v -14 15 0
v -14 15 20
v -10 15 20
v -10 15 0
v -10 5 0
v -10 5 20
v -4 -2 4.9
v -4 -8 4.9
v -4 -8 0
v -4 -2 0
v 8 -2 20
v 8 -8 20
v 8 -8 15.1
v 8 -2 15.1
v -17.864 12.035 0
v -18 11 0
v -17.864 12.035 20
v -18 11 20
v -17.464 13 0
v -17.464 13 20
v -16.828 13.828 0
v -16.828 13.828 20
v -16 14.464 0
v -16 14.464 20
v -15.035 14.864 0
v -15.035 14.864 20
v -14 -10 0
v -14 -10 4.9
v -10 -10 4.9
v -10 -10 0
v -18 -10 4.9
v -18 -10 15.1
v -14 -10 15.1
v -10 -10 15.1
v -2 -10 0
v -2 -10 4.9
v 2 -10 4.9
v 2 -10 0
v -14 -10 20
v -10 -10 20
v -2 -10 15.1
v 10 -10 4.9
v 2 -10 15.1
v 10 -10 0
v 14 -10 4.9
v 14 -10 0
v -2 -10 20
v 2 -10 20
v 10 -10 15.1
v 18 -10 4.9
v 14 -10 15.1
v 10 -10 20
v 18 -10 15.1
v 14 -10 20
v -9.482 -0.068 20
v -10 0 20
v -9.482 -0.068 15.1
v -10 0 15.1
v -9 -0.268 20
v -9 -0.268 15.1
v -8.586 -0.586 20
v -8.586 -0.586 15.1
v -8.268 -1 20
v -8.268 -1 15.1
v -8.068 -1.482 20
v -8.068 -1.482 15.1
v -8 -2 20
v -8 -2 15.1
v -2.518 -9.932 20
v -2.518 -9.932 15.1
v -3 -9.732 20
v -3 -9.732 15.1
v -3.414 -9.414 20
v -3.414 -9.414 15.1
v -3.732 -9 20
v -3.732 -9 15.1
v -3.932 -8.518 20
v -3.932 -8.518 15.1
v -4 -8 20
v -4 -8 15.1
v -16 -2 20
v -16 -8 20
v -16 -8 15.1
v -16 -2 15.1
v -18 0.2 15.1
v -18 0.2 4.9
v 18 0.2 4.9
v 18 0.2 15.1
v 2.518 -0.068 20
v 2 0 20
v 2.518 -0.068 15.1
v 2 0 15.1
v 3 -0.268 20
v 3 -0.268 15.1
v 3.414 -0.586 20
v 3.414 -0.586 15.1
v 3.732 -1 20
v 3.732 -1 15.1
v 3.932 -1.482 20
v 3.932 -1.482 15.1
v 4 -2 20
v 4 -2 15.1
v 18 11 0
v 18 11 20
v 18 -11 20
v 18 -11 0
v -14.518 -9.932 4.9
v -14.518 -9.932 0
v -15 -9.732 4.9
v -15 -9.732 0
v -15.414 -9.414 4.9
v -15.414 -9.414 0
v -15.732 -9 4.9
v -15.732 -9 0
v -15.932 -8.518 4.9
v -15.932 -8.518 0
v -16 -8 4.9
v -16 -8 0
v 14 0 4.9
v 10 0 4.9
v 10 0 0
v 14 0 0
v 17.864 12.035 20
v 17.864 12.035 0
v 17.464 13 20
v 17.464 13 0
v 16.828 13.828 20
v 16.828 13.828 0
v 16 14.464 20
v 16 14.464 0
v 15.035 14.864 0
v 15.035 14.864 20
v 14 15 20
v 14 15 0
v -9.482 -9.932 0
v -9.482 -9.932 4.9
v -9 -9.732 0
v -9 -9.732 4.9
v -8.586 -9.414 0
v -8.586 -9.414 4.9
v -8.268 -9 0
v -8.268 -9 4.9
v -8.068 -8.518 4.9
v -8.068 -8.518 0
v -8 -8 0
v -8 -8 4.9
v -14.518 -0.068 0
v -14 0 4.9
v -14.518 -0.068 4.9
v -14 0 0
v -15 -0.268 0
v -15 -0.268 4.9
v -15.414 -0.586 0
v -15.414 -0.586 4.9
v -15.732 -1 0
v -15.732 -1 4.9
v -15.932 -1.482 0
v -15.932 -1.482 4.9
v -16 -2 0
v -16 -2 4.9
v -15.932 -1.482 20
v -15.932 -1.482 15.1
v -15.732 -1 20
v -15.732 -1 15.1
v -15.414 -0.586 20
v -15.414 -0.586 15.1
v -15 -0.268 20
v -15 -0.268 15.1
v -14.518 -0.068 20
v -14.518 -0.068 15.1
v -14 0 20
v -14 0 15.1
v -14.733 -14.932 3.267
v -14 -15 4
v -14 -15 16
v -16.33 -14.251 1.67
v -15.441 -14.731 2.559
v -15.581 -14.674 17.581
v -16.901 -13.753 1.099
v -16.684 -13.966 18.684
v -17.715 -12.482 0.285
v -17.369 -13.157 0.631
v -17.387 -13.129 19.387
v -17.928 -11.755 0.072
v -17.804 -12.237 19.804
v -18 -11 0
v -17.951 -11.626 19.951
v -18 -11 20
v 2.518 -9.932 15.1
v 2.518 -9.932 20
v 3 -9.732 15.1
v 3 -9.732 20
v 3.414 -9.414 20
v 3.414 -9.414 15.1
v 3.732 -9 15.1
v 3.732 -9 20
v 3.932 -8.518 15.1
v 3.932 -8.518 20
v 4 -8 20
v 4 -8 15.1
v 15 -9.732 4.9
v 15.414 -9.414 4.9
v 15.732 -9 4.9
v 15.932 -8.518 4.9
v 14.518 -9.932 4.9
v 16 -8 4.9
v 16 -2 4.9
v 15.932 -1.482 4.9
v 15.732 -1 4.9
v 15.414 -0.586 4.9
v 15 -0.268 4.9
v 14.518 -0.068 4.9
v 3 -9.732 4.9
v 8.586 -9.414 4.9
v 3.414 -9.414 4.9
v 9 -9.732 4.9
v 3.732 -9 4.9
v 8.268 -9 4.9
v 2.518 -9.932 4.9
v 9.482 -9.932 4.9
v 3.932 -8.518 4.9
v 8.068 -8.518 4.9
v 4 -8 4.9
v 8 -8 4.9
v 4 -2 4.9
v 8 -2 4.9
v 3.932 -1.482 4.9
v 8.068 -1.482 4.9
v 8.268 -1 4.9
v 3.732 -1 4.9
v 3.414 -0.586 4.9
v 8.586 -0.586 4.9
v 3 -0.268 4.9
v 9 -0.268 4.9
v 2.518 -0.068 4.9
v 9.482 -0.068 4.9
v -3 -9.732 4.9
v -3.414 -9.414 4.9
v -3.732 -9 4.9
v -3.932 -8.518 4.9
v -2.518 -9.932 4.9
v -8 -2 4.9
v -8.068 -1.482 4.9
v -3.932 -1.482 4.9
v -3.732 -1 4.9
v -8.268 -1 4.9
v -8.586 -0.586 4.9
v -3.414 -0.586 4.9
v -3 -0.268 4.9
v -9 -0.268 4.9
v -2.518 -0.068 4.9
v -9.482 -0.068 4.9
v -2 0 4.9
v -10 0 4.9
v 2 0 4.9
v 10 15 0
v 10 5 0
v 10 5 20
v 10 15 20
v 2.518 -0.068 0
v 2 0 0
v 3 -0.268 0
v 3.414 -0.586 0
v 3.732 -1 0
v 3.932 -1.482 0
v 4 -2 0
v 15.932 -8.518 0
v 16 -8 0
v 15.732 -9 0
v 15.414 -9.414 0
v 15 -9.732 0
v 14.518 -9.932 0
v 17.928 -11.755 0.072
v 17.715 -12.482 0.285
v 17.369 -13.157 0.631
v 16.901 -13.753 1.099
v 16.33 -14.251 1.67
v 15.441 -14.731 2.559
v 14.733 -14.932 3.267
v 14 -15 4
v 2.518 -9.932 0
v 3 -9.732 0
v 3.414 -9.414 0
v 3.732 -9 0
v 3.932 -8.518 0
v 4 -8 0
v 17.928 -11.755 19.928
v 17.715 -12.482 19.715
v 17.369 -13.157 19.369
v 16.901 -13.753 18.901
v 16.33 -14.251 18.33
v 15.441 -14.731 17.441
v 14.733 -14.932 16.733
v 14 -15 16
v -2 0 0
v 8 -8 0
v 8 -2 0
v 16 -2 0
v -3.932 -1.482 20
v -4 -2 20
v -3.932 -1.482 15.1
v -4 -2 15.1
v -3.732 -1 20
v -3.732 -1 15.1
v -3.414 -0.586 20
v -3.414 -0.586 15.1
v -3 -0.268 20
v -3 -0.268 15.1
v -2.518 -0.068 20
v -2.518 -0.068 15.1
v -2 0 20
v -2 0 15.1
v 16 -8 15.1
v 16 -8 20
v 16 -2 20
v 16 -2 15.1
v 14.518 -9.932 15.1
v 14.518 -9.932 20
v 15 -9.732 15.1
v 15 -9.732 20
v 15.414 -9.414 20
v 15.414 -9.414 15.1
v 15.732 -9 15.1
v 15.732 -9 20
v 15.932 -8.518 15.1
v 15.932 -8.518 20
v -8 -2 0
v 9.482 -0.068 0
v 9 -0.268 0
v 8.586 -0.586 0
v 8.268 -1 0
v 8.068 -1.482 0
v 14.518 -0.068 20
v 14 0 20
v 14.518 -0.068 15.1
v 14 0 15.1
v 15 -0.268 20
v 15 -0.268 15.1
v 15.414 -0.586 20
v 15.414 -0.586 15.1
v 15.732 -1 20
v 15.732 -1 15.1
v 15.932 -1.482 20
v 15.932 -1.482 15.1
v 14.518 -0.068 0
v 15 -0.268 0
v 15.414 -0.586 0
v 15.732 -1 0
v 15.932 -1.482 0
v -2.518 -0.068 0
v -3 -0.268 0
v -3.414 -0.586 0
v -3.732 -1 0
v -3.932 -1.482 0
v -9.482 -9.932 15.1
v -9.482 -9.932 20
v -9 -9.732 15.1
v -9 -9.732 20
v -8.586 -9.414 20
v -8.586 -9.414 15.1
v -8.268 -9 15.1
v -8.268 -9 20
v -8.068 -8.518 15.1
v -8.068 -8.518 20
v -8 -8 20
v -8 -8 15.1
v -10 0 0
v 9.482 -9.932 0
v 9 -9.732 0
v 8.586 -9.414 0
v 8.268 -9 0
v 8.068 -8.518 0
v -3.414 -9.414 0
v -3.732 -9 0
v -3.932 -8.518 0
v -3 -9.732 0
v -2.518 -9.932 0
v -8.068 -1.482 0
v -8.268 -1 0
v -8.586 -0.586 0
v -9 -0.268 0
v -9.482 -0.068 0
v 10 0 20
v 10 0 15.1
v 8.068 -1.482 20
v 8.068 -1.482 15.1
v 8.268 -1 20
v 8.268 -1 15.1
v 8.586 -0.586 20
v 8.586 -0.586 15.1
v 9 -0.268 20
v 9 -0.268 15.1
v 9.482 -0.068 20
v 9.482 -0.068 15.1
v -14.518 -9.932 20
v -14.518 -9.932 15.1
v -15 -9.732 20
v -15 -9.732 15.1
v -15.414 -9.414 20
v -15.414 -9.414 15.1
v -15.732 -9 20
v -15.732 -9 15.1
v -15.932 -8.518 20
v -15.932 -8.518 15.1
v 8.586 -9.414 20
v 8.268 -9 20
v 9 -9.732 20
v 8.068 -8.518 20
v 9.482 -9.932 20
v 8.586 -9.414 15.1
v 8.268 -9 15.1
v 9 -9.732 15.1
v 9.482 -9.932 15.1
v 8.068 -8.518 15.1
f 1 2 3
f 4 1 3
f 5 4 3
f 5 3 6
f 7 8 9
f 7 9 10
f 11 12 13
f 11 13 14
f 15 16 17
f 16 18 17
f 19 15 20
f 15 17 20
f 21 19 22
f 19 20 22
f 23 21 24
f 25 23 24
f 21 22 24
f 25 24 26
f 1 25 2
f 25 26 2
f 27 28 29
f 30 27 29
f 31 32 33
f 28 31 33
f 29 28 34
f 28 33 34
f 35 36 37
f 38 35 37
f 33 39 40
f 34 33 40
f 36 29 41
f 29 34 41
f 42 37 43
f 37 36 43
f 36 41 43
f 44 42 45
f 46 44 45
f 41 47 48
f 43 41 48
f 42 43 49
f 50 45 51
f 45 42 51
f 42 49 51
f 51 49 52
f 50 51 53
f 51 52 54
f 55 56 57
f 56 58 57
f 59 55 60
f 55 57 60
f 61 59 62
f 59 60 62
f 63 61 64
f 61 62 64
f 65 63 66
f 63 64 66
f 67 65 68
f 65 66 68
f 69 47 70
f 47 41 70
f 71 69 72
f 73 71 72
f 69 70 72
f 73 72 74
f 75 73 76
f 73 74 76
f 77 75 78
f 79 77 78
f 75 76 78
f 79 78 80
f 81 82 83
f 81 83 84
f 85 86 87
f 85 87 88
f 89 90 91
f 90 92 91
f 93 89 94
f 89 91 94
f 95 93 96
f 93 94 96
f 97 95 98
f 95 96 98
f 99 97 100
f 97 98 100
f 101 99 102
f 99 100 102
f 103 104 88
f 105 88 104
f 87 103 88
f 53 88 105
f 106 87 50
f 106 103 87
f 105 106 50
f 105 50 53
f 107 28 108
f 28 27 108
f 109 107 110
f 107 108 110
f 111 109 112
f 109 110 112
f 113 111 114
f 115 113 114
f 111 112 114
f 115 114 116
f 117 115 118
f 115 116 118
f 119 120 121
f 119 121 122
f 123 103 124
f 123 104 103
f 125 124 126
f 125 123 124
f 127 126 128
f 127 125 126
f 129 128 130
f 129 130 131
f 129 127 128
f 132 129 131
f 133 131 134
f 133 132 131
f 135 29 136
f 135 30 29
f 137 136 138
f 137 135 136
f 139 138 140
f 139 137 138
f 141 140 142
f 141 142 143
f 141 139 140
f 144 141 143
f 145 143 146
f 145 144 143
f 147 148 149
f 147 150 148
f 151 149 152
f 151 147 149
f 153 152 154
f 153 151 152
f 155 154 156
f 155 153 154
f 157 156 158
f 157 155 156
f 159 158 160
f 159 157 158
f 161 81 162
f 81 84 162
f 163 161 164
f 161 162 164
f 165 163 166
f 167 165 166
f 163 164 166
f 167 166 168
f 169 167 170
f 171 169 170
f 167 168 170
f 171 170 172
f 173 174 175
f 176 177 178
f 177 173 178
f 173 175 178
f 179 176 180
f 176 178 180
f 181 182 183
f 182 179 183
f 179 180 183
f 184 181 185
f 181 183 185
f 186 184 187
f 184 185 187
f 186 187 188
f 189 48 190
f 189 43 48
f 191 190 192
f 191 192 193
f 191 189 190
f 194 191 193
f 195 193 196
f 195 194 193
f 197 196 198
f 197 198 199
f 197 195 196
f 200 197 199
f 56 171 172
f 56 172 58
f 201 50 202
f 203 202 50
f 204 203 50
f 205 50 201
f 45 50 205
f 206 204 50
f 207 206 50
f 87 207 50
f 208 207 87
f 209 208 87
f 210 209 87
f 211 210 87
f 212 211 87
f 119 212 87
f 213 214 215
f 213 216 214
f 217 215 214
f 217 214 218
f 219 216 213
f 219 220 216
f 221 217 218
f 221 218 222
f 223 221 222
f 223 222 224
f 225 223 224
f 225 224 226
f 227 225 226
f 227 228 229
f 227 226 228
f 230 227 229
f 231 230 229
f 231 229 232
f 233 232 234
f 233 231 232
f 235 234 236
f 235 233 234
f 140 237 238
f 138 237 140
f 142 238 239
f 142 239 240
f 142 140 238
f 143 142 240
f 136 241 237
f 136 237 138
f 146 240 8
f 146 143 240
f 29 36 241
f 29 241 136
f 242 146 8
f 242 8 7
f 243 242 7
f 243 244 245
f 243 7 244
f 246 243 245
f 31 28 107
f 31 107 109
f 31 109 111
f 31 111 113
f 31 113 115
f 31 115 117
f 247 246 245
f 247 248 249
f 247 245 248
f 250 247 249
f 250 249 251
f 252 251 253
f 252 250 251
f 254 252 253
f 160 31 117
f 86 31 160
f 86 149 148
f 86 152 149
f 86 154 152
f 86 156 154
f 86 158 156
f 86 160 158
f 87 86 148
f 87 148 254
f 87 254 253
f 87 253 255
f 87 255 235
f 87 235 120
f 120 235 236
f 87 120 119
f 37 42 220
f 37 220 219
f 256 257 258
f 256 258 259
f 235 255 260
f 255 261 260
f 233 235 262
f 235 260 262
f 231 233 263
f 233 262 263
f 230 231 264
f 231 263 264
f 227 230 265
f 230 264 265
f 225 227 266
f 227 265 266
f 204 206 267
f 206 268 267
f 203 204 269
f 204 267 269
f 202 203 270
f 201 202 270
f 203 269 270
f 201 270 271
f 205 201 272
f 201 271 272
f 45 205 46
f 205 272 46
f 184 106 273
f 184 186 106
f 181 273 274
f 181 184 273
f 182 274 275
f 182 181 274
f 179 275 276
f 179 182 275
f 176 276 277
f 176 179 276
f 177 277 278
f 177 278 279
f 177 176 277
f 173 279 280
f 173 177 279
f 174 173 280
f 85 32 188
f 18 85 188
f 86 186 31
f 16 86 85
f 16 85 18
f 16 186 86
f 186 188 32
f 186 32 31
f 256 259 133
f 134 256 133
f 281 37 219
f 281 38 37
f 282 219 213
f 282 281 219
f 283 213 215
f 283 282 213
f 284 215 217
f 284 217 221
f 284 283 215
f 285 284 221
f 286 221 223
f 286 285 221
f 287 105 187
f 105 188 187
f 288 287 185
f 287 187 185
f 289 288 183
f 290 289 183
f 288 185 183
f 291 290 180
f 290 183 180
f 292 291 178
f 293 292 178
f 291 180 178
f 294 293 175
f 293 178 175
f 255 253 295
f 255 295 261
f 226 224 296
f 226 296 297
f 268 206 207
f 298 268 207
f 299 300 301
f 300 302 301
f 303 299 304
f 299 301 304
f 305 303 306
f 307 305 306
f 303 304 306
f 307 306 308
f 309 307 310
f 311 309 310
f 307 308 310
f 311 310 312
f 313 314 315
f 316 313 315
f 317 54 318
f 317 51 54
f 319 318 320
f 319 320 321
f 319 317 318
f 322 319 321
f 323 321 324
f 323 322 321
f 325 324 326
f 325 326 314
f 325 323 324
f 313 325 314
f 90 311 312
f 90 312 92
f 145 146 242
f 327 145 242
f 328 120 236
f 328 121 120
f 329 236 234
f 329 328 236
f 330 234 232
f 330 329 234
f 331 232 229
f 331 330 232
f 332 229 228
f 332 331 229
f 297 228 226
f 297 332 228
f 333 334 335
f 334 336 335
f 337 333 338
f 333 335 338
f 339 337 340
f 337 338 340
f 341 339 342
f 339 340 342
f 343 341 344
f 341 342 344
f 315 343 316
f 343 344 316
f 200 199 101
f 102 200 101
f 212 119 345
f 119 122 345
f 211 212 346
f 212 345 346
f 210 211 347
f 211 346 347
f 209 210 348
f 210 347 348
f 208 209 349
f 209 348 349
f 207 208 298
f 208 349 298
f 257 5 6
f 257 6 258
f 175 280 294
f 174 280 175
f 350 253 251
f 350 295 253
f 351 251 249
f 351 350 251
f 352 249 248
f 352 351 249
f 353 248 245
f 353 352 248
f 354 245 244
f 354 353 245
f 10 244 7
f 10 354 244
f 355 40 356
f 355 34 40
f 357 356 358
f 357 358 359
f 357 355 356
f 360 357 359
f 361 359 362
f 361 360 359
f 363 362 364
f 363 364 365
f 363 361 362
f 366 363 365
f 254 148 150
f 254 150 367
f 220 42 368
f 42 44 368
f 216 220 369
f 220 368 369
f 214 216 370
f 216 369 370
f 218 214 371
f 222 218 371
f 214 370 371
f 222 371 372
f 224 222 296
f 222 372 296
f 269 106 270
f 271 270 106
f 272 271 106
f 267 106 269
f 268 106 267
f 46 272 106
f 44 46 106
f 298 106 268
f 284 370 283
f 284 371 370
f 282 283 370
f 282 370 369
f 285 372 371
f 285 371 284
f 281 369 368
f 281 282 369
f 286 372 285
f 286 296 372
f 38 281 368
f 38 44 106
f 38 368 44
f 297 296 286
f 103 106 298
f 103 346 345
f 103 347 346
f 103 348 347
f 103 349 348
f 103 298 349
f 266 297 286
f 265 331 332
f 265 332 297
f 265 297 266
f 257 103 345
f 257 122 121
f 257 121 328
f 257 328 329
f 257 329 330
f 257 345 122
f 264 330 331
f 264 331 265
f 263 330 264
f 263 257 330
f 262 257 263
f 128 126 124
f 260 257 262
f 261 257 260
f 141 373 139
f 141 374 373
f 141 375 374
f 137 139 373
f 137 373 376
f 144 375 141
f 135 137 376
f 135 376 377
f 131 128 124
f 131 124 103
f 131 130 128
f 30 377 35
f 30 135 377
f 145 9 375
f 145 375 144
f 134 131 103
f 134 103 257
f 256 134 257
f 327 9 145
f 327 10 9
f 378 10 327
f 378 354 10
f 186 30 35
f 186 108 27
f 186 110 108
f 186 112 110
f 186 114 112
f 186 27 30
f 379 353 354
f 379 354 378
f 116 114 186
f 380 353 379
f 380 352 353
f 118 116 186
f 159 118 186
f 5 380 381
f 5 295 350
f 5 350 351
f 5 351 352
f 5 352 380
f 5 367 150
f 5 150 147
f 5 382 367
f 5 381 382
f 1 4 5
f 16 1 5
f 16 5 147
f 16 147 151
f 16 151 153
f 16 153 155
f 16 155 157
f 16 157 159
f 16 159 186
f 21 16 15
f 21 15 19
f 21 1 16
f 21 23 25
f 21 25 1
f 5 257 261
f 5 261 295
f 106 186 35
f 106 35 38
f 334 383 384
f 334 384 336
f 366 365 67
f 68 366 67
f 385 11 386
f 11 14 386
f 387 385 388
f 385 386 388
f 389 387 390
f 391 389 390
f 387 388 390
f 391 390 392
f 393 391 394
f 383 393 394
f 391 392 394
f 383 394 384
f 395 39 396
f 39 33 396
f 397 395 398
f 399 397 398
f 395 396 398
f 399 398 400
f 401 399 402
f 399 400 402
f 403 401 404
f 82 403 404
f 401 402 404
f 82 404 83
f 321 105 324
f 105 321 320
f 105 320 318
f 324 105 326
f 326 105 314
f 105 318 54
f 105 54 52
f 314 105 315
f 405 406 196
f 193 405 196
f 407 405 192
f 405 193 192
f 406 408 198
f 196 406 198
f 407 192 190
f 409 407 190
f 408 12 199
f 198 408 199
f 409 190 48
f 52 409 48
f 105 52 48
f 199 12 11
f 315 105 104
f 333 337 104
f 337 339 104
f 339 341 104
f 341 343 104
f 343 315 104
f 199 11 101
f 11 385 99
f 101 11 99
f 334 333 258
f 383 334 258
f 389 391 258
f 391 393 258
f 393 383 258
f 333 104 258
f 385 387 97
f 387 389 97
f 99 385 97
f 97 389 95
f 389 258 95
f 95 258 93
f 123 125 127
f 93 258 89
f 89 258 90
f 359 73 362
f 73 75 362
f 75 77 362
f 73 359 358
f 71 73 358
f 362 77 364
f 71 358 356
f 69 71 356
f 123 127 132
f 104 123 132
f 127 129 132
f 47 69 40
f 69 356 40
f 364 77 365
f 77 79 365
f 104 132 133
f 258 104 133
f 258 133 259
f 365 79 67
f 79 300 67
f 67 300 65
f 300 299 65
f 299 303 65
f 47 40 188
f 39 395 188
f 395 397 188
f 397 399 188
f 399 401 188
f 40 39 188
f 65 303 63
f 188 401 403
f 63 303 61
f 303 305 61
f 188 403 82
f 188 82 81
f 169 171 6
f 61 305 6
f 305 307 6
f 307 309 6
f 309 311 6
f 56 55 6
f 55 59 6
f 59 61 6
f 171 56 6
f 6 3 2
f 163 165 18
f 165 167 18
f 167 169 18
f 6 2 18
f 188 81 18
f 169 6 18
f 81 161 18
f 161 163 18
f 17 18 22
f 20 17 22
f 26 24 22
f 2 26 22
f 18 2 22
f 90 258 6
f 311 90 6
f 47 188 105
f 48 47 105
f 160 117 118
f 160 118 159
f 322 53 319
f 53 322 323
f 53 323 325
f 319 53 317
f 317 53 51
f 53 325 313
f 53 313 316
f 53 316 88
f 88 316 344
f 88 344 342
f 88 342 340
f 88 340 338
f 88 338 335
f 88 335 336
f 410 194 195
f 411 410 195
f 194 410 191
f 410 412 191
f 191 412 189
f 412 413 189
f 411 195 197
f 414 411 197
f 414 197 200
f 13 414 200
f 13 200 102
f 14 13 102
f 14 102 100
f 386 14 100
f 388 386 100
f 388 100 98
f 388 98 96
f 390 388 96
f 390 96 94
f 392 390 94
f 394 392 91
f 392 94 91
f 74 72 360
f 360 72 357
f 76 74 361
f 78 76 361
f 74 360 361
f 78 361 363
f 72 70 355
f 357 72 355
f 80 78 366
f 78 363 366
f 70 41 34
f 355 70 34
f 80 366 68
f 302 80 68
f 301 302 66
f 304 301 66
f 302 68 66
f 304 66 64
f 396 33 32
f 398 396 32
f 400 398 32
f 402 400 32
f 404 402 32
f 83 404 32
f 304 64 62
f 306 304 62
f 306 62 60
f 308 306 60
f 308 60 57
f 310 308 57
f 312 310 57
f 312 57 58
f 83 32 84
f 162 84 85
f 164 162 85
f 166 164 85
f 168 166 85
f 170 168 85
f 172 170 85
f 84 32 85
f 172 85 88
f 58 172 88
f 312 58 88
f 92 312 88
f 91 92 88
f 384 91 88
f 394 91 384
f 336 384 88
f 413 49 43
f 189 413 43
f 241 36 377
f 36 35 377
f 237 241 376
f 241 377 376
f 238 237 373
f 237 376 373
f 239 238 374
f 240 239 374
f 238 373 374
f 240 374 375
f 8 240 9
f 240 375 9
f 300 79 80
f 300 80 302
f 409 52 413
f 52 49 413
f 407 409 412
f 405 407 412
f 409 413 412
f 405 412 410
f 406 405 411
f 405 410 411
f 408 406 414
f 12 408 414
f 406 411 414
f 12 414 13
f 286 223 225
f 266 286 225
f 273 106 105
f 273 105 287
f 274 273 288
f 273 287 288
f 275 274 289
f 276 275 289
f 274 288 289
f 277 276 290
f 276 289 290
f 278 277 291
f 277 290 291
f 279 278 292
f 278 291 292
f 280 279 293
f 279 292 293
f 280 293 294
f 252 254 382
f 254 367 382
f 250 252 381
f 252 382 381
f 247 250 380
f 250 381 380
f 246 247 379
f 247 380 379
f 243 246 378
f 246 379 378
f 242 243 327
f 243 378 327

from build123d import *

# Parameters (mm, degrees)
BOSS_EXTRUDE1_DEPTH = 20
SKETCH5_W           = 10.2
SKETCH5_H           = 10.2
CUT_EXTRUDE2_DEPTH  = 44.829214002
SKETCH6_W           = 8
SKETCH6_H           = 10
CUT_EXTRUDE3_DEPTH  = 31.805843601
FILLET1_R           = 2
FILLET3_R           = 4
FILLET4_R           = 4


with BuildPart() as part:
    # Sketch1 → Boss-Extrude1 (new body)
    with BuildSketch(Plane.XY):
        Polygon((-10, 15), (-10, 5), (10, 5), (10, 15), (18, 15), (18, -15), (-18, -15), (-18, 15), align=None)
    extrude(amount=BOSS_EXTRUDE1_DEPTH)

    # Sketch5 → Cut-Extrude2 (cut, through all)
    with BuildSketch(Plane.ZY.offset(18)):
        with Locations((10, -4.9)):
            Rectangle(SKETCH5_W, SKETCH5_H)
    extrude(amount=-CUT_EXTRUDE2_DEPTH, mode=Mode.SUBTRACT)

    # Sketch6 → Cut-Extrude3 (cut, through all)
    with BuildSketch(Plane.XY.offset(20)):
        with Locations((0, -5)):
            Rectangle(SKETCH6_W, SKETCH6_H)
        with Locations((-12, -5)):
            Rectangle(SKETCH6_W, SKETCH6_H)
        with Locations((12, -5)):
            Rectangle(SKETCH6_W, SKETCH6_H)
    extrude(amount=-CUT_EXTRUDE3_DEPTH, mode=Mode.SUBTRACT)

    # Fillet1
    fillet1_edges = [part.edges().sort_by_distance(p)[0] for p in [
        (16, 0, 17.55),
        (16, 0, 2.45),
        (16, -10, 17.55),
        (16, -10, 2.45),
        (8, -10, 17.55),
        (8, -10, 2.45),
        (8, 0, 17.55),
        (8, 0, 2.45),
        (-4, -10, 17.55),
        (-4, -10, 2.45),
        (-4, 0, 17.55),
        (-4, 0, 2.45),
        (4, 0, 17.55),
        (4, 0, 2.45),
        (4, -10, 17.55),
        (4, -10, 2.45),
        (-16, -10, 17.55),
        (-16, -10, 2.45),
        (-16, 0, 17.55),
        (-16, 0, 2.45),
        (-8, 0, 17.55),
        (-8, 0, 2.45),
        (-8, -10, 17.55),
        (-8, -10, 2.45),
    ]]
    fillet(fillet1_edges, radius=FILLET1_R)

    # Fillet3
    fillet3_edges = [part.edges().sort_by_distance(p)[0] for p in [
        (0, -15, 0),
        (18, -15, 10),
        (-18, -15, 10),
        (0, -15, 20),
    ]]
    fillet(fillet3_edges, radius=FILLET3_R)

    # Fillet4
    fillet4_edges = [part.edges().sort_by_distance(p)[0] for p in [
        (18, 15, 10),
        (-18, 15, 10),
    ]]
    fillet(fillet4_edges, radius=FILLET4_R)


solid = part.part
